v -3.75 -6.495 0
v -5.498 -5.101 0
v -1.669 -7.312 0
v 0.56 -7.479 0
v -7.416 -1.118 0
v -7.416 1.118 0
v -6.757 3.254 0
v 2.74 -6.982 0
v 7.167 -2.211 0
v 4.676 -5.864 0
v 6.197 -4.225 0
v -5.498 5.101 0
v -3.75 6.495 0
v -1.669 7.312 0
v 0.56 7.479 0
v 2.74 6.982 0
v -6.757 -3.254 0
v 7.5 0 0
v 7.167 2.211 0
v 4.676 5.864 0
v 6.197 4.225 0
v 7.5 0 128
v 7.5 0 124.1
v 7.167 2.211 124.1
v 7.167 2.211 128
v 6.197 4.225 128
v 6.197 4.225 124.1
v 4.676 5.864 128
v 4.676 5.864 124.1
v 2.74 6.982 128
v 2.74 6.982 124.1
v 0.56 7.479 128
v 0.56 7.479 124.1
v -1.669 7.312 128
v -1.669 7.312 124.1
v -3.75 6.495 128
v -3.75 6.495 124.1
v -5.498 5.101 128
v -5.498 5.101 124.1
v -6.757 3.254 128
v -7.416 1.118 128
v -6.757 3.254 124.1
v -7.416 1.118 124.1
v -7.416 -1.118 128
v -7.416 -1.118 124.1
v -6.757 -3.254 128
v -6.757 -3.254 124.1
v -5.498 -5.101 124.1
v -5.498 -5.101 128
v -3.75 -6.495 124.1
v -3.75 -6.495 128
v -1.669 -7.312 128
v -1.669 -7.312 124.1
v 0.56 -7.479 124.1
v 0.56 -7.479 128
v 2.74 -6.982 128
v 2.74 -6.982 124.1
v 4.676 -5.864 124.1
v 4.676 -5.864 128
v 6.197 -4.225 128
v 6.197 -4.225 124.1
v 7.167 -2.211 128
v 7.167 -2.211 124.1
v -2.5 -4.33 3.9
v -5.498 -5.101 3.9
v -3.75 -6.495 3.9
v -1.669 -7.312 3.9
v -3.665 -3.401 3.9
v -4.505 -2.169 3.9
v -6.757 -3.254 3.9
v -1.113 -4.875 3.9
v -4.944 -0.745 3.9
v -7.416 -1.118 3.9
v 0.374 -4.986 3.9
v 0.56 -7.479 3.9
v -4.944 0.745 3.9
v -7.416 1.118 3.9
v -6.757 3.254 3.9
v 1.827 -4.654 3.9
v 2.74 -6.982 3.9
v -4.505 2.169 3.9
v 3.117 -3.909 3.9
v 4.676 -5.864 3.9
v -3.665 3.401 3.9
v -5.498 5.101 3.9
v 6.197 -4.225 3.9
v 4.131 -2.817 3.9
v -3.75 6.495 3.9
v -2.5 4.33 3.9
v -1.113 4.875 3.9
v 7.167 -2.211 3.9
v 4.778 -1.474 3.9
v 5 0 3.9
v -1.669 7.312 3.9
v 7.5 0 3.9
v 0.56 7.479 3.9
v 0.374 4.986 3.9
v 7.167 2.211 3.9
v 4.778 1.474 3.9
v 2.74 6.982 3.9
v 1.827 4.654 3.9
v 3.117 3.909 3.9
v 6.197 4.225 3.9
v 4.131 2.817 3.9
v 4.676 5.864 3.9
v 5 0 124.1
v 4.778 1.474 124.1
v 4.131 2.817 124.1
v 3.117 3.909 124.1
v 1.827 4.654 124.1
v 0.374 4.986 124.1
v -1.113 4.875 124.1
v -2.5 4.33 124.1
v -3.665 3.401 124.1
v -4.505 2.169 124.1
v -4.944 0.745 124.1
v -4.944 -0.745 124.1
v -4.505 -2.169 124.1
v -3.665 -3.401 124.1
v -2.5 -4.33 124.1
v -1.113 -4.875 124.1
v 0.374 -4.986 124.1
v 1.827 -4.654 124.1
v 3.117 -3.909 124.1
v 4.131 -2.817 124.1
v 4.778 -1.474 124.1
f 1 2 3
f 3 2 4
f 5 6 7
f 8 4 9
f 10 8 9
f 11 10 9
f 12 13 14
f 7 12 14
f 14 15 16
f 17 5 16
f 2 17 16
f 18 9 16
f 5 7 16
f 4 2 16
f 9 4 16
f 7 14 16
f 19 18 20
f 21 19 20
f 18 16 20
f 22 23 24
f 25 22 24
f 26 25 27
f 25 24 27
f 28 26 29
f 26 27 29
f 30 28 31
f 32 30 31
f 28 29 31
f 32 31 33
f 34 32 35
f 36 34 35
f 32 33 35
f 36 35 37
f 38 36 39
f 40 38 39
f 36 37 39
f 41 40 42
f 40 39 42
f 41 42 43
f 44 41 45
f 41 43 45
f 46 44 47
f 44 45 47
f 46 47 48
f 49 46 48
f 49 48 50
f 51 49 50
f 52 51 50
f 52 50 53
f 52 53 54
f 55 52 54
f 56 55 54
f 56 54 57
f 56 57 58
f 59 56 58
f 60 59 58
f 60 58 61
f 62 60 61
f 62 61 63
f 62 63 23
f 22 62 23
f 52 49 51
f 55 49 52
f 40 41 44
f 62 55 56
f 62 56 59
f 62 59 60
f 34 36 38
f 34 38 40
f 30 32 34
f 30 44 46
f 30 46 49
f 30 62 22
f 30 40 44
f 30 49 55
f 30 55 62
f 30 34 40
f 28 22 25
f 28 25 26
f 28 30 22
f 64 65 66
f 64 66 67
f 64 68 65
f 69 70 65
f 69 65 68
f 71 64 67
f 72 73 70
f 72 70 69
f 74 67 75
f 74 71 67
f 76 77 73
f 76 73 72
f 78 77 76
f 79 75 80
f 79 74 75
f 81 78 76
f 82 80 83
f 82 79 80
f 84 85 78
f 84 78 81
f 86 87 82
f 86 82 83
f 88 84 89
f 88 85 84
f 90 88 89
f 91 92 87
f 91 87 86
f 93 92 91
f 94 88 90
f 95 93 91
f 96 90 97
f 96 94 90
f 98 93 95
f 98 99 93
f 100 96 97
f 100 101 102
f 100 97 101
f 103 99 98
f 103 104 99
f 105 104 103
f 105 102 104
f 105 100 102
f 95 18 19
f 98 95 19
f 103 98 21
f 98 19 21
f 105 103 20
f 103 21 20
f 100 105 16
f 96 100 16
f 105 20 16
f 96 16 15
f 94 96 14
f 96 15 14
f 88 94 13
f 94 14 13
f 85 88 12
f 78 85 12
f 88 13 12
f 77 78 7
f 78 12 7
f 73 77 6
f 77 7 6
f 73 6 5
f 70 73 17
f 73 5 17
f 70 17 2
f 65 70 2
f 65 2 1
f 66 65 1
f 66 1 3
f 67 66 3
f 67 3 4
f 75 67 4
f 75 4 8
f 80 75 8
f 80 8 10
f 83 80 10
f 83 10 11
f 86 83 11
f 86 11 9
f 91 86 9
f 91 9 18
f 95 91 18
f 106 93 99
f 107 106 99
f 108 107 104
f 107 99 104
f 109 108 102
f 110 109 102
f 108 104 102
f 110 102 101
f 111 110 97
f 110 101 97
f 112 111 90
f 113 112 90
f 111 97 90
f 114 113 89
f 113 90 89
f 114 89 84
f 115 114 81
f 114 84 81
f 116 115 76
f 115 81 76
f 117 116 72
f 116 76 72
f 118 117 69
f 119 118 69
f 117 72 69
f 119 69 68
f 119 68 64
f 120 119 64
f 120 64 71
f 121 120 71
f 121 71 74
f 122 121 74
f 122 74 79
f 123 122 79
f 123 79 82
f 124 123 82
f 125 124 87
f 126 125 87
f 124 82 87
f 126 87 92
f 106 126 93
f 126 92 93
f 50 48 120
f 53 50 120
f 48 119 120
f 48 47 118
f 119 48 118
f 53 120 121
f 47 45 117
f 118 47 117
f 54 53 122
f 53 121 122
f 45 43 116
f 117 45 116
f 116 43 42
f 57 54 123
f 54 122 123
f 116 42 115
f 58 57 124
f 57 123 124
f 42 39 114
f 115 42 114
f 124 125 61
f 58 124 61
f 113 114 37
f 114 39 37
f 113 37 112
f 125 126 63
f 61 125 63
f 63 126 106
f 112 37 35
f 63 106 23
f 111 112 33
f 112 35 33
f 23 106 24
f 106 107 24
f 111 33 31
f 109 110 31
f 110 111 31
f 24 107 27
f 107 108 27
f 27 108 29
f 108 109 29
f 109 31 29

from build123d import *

# Parameters (mm, degrees)
SKETCH1_R           = 7.5
SKETCH1_R_2         = 5
BOSS_EXTRUDE1_DEPTH = 128
CUT_EXTRUDE1_START  = 3.9
SKETCH1_6_R         = 7.5
SKETCH1_6_R_2       = 5
CUT_EXTRUDE1_DEPTH  = 120.2


with BuildPart() as part:
    # Sketch1 → Boss-Extrude1 (new body)
    with BuildSketch(Plane.XY):
        Circle(SKETCH1_R)
        Circle(SKETCH1_R_2, mode=Mode.SUBTRACT)
        Circle(SKETCH1_R_2)
    extrude(amount=BOSS_EXTRUDE1_DEPTH)

    # Sketch1<6> → Cut-Extrude1 (cut)
    with BuildSketch(Plane.XY.offset(CUT_EXTRUDE1_START)):
        Circle(SKETCH1_6_R)
        Circle(SKETCH1_6_R_2, mode=Mode.SUBTRACT)
    extrude(amount=CUT_EXTRUDE1_DEPTH, mode=Mode.SUBTRACT)


solid = part.part
